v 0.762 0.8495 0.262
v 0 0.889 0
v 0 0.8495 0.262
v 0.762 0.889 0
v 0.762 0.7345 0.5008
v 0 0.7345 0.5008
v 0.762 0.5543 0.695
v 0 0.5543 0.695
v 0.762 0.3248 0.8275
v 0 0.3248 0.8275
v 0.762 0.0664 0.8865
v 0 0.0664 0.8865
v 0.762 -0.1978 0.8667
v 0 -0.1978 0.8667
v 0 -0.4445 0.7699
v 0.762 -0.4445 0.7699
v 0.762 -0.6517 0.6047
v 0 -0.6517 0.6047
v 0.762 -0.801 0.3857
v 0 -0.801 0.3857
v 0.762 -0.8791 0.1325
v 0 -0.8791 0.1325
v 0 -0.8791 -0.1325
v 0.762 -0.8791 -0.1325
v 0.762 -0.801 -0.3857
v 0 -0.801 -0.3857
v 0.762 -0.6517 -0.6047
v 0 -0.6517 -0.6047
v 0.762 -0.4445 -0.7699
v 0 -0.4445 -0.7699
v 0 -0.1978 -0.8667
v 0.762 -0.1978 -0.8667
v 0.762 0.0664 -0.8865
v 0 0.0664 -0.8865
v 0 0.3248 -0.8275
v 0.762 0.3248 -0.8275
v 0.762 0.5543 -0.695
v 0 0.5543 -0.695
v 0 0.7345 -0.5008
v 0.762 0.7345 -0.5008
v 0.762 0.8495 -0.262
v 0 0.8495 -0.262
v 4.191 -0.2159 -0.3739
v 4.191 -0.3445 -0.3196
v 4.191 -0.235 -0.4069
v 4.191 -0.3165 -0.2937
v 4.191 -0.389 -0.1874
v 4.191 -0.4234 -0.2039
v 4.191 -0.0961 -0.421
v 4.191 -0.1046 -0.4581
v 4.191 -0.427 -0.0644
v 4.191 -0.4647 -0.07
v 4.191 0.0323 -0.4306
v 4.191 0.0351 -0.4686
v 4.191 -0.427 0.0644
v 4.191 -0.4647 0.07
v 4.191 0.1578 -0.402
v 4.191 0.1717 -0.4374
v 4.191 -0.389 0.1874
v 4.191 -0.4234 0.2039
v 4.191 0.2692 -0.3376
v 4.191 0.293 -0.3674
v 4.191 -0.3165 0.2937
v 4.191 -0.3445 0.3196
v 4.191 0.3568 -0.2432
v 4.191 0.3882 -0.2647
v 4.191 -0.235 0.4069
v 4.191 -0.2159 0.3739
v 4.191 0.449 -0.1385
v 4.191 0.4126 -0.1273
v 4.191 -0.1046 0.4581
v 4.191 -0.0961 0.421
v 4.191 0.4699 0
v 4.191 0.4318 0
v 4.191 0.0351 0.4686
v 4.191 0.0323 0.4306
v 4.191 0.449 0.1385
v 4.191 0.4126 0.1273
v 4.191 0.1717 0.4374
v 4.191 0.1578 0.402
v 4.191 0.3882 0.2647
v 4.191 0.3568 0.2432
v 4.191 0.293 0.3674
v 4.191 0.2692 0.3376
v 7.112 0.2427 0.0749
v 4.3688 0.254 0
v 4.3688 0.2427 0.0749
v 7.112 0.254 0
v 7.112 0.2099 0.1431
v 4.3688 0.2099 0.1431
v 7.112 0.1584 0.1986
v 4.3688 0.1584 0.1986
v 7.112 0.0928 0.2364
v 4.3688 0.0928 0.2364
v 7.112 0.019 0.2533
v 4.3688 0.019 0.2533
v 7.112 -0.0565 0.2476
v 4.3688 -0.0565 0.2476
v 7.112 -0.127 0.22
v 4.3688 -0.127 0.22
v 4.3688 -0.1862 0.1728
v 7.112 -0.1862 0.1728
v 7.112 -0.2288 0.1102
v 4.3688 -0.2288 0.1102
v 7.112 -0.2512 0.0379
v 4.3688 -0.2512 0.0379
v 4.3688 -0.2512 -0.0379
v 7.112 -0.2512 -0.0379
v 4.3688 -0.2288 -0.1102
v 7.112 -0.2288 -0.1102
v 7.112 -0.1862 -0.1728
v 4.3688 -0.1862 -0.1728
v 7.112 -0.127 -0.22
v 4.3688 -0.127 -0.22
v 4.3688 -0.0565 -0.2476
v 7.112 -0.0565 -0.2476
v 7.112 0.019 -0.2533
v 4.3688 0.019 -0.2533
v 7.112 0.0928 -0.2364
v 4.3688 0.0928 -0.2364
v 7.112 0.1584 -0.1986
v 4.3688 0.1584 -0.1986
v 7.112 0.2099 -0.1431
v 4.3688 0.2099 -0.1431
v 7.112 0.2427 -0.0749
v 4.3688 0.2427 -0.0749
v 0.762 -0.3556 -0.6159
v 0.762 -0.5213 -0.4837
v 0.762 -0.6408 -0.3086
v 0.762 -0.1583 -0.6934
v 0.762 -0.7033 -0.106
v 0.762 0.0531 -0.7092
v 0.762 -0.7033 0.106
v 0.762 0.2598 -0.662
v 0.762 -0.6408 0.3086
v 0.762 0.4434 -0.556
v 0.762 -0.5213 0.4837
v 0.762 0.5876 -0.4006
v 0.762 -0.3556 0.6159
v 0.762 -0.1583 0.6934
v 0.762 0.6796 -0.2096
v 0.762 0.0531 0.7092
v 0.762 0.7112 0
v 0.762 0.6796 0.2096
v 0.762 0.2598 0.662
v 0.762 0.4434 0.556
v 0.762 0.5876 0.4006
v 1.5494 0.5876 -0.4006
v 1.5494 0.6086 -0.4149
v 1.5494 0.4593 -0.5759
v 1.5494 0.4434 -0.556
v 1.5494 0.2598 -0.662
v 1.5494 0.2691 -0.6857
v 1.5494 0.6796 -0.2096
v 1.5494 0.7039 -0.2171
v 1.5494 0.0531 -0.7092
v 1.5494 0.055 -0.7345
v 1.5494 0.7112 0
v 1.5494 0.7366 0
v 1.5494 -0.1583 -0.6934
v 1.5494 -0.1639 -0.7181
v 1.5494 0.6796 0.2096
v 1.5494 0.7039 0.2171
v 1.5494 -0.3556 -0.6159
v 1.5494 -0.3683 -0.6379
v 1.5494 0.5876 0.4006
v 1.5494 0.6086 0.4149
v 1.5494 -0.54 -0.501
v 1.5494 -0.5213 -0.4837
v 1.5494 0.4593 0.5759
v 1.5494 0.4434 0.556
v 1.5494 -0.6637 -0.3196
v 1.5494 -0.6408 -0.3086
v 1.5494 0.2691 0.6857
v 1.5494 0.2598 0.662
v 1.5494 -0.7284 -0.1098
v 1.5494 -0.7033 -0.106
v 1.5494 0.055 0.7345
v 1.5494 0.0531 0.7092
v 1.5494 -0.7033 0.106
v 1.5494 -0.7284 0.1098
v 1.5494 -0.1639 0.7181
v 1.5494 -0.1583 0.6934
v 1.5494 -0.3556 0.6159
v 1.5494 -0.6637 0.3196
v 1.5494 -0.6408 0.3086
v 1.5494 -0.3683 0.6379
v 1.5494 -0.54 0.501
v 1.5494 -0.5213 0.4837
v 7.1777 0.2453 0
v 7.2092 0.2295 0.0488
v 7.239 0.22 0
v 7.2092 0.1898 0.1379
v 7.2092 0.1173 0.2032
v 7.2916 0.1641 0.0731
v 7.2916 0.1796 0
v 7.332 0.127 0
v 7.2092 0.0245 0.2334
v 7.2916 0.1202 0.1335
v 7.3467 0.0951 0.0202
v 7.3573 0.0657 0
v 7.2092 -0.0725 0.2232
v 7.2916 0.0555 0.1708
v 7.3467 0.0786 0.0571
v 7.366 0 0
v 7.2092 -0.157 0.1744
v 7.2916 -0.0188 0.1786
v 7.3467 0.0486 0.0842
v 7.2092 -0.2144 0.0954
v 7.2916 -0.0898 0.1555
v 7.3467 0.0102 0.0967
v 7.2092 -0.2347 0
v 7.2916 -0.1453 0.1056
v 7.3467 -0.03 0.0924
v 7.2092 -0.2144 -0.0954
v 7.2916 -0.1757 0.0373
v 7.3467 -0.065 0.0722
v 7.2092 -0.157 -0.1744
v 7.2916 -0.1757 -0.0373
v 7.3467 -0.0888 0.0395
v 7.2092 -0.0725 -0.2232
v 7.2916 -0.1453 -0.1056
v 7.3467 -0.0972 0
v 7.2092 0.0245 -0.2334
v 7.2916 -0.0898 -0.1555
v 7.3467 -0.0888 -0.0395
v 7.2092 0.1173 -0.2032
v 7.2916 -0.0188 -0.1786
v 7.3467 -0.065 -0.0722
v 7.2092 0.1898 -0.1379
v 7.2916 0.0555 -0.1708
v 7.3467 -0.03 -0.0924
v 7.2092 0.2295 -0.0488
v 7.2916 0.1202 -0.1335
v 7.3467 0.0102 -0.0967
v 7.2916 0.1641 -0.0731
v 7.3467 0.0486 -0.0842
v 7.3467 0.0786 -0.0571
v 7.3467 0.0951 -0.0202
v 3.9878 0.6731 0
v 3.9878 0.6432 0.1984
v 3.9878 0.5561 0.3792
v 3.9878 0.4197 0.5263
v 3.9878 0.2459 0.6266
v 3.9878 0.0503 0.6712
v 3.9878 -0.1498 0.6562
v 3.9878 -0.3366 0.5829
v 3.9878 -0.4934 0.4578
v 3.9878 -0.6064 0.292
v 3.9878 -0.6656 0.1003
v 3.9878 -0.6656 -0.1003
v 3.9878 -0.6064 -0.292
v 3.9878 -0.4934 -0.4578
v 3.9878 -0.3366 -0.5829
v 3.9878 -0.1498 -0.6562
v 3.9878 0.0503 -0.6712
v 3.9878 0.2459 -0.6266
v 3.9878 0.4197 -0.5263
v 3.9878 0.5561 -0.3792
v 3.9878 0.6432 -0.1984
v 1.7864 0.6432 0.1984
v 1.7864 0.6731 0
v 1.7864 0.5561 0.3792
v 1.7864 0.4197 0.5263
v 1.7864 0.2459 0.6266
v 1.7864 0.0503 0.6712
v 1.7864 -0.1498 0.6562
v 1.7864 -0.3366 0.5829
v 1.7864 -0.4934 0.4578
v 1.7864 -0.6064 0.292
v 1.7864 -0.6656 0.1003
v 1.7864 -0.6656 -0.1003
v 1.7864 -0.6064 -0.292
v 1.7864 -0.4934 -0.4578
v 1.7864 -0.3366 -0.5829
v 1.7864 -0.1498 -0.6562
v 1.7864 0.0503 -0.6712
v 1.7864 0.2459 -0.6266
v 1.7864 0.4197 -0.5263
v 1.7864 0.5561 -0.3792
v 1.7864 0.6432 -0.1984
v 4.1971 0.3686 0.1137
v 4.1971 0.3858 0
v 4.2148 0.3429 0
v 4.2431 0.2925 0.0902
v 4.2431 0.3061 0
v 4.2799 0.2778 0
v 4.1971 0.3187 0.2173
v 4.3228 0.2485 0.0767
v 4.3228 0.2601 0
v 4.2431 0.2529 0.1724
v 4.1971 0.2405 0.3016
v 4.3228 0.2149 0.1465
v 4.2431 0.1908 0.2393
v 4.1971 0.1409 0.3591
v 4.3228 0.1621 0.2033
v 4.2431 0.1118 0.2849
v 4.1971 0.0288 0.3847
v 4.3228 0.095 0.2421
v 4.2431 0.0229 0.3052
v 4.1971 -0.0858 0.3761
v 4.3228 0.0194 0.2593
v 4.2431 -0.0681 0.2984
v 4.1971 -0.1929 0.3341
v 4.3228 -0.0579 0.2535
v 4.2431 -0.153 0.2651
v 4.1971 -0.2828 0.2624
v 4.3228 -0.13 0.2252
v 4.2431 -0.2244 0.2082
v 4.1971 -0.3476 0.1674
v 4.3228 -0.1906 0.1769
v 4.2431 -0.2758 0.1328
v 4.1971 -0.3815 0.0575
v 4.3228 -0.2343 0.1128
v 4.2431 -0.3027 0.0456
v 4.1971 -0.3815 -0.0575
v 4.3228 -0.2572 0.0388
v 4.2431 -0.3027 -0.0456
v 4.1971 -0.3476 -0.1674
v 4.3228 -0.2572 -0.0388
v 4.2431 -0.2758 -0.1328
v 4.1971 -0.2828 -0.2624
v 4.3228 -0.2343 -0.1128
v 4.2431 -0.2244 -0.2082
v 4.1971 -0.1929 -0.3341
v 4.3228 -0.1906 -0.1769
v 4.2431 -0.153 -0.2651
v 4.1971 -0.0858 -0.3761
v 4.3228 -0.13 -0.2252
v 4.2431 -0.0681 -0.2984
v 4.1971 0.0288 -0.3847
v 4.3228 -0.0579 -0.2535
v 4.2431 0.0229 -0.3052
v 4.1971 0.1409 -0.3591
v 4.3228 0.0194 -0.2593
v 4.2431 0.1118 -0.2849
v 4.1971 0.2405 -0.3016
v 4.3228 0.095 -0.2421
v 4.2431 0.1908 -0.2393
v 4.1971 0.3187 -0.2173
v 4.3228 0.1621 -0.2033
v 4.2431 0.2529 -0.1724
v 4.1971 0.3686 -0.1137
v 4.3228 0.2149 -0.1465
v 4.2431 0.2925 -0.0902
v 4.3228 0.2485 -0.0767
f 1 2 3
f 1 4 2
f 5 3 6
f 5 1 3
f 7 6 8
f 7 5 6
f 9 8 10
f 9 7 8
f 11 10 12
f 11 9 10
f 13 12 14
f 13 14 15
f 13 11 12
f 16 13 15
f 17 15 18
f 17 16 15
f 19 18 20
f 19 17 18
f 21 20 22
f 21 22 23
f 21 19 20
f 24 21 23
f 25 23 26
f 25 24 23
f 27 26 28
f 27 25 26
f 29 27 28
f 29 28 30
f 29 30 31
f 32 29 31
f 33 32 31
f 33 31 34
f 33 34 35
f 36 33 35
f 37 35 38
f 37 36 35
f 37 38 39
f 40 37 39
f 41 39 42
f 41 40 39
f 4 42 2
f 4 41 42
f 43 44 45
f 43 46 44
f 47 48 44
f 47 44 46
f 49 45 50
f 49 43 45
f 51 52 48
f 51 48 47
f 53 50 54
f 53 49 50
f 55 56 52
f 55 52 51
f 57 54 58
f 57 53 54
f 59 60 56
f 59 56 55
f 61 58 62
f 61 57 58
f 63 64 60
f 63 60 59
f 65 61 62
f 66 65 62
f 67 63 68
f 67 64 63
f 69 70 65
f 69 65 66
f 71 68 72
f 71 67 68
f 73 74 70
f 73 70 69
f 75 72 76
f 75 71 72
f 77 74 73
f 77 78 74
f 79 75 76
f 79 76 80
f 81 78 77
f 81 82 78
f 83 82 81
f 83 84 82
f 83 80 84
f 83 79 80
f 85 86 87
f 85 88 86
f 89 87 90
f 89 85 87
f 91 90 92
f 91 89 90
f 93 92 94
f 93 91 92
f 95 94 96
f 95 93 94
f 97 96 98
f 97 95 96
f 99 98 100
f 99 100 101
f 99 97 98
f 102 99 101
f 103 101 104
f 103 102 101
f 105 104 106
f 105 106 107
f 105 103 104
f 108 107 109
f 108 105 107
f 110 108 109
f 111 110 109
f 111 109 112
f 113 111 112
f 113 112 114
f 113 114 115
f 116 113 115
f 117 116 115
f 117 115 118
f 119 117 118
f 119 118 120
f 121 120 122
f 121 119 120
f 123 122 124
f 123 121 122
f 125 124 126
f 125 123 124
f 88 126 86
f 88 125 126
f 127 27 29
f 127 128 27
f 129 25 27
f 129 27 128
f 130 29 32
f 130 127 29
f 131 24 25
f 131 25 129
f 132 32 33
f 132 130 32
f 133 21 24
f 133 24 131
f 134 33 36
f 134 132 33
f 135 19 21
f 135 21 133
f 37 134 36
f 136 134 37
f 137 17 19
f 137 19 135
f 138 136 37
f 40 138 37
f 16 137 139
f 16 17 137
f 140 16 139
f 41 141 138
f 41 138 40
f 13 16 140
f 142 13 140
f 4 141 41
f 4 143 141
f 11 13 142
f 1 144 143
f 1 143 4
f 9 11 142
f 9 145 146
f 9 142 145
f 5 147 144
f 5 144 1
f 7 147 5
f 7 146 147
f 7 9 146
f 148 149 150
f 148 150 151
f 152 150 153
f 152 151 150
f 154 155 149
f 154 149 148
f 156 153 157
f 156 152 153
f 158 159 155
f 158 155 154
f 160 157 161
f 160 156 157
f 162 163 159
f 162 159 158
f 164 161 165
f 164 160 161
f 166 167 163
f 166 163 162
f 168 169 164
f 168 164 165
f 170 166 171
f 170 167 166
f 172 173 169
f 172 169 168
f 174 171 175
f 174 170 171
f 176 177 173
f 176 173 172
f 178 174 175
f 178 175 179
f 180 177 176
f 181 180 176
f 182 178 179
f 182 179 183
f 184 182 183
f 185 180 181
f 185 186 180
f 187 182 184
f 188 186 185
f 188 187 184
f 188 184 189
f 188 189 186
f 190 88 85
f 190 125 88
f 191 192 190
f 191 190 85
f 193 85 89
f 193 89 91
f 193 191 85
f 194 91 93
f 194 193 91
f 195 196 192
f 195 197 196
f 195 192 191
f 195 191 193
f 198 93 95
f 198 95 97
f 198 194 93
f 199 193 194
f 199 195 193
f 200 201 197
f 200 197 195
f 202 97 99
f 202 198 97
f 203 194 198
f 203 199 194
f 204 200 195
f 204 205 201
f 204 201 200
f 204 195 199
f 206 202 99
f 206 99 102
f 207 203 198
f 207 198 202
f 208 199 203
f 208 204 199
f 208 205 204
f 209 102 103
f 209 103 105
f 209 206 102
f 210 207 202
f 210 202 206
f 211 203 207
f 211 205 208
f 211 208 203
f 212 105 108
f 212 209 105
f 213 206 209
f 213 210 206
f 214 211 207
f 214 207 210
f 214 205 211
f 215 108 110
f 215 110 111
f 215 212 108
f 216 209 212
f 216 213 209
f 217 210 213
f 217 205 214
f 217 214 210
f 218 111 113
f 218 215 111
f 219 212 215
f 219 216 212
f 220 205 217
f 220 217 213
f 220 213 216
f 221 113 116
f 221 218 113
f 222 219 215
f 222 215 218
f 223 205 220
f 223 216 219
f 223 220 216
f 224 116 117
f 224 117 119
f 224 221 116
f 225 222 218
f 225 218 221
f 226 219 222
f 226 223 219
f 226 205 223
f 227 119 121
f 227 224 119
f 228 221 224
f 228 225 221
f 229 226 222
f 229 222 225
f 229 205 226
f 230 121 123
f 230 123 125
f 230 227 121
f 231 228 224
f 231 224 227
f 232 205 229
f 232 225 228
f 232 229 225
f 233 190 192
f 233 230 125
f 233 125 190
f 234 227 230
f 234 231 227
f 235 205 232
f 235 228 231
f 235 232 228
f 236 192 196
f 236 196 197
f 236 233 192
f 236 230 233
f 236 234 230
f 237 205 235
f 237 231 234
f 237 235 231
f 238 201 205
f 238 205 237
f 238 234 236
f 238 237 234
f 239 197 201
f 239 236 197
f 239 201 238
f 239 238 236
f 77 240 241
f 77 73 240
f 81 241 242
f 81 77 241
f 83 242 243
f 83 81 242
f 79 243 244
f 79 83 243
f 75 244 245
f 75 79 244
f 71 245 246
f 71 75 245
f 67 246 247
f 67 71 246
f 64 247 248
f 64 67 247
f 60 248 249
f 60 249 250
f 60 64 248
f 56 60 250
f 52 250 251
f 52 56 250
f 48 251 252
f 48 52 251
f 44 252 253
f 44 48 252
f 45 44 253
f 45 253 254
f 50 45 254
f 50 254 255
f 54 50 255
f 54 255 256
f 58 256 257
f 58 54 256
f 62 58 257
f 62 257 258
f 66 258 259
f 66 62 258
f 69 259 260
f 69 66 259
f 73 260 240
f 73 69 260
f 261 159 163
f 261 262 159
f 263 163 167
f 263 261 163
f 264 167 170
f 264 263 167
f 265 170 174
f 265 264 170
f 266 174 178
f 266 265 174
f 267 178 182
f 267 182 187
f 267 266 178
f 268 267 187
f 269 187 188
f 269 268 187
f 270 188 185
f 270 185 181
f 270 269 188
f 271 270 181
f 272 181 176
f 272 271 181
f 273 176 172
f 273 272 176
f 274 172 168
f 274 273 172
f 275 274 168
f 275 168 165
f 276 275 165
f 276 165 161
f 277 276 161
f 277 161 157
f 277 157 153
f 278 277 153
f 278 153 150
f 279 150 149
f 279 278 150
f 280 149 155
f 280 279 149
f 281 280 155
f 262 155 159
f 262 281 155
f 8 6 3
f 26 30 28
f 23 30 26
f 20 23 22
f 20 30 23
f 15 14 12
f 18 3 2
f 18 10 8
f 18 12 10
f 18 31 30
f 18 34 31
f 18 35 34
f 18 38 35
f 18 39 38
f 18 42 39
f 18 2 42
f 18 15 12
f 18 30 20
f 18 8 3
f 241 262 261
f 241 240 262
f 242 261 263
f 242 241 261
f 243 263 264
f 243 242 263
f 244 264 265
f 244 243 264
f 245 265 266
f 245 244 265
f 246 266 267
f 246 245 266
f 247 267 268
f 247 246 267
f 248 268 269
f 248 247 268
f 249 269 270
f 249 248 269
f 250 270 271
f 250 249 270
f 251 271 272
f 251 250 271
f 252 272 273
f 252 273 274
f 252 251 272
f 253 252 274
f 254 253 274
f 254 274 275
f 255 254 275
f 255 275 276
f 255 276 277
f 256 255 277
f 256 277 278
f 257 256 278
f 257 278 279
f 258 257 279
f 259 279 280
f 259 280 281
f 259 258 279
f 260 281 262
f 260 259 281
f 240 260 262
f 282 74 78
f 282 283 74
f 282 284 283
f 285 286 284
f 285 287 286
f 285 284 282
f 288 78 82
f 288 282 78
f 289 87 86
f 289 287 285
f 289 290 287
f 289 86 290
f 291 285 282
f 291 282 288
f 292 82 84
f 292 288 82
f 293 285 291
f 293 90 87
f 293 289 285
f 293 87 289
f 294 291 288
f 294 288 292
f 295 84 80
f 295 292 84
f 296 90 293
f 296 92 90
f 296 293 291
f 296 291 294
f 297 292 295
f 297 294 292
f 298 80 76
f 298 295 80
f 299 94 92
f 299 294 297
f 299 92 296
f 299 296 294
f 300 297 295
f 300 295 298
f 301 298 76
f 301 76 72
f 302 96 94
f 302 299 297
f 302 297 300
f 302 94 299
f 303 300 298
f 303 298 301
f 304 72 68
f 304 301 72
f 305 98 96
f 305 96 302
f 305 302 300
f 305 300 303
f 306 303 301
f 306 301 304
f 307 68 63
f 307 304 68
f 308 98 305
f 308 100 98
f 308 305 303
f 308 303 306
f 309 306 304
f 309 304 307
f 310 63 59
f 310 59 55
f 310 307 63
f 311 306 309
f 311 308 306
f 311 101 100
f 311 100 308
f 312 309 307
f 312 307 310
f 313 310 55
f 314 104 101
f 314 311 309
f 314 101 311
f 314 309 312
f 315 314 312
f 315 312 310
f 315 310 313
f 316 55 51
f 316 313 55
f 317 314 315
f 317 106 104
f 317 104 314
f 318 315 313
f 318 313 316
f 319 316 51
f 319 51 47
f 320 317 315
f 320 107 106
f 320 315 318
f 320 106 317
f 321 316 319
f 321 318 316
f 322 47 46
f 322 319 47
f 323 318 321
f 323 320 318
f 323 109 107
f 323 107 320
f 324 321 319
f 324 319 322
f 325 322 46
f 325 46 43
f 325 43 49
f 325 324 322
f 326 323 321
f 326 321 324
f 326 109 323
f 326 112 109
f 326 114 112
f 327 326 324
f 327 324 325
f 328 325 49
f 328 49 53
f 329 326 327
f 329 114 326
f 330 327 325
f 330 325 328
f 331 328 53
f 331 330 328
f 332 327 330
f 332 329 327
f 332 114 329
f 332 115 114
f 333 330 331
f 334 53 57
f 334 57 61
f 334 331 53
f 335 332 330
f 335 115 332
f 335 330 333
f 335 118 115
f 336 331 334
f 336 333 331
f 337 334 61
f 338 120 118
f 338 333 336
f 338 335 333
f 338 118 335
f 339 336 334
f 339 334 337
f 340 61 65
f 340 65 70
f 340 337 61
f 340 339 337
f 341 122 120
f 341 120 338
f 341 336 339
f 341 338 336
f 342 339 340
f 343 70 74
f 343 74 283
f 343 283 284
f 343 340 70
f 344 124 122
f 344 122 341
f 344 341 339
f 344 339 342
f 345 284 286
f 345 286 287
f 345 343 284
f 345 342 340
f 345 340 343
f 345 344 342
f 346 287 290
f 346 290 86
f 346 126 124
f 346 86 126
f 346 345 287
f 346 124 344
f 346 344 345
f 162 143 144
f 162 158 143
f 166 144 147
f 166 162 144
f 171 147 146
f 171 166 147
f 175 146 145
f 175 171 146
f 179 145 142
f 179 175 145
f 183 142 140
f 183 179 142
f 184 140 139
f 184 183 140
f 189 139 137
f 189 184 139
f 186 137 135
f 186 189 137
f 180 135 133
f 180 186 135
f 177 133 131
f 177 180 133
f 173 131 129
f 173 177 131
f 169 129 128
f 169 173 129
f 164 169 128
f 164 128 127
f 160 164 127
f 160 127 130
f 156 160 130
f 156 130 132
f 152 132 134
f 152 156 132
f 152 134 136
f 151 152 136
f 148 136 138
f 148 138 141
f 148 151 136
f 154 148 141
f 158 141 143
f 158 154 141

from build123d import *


with BuildPart() as part:
    # Sketch1 → RevolutionAngle1 (revolve)
    with BuildSketch(Plane.XY):
        with BuildLine():
            Line((4.191, 0.4699), (4.191, 0.4318))
            ThreePointArc((4.191, 0.4318), (4.243076414, 0.306076414), (4.3688, 0.254))
            Line((4.3688, 0.254), (7.112, 0.254))
            ThreePointArc((7.112, 0.254), (7.291605122, 0.179605122), (7.366, 0))
            Line((7.366, 0), (0, 0))
            Line((0, 0), (0, 0.889))
            Line((0, 0.889), (0.762, 0.889))
            Line((0.762, 0.889), (0.762, 0.7112))
            Line((0.762, 0.7112), (1.5494, 0.7112))
            Line((1.5494, 0.7112), (1.5494, 0.7366))
            Line((1.5494, 0.7366), (1.786385226, 0.6731))
            Line((1.786385226, 0.6731), (3.9878, 0.6731))
            Line((3.9878, 0.6731), (4.191, 0.4699))
        make_face()
    revolve(axis=Axis((0, 0, 0), (1, 0, 0)))


solid = part.part
